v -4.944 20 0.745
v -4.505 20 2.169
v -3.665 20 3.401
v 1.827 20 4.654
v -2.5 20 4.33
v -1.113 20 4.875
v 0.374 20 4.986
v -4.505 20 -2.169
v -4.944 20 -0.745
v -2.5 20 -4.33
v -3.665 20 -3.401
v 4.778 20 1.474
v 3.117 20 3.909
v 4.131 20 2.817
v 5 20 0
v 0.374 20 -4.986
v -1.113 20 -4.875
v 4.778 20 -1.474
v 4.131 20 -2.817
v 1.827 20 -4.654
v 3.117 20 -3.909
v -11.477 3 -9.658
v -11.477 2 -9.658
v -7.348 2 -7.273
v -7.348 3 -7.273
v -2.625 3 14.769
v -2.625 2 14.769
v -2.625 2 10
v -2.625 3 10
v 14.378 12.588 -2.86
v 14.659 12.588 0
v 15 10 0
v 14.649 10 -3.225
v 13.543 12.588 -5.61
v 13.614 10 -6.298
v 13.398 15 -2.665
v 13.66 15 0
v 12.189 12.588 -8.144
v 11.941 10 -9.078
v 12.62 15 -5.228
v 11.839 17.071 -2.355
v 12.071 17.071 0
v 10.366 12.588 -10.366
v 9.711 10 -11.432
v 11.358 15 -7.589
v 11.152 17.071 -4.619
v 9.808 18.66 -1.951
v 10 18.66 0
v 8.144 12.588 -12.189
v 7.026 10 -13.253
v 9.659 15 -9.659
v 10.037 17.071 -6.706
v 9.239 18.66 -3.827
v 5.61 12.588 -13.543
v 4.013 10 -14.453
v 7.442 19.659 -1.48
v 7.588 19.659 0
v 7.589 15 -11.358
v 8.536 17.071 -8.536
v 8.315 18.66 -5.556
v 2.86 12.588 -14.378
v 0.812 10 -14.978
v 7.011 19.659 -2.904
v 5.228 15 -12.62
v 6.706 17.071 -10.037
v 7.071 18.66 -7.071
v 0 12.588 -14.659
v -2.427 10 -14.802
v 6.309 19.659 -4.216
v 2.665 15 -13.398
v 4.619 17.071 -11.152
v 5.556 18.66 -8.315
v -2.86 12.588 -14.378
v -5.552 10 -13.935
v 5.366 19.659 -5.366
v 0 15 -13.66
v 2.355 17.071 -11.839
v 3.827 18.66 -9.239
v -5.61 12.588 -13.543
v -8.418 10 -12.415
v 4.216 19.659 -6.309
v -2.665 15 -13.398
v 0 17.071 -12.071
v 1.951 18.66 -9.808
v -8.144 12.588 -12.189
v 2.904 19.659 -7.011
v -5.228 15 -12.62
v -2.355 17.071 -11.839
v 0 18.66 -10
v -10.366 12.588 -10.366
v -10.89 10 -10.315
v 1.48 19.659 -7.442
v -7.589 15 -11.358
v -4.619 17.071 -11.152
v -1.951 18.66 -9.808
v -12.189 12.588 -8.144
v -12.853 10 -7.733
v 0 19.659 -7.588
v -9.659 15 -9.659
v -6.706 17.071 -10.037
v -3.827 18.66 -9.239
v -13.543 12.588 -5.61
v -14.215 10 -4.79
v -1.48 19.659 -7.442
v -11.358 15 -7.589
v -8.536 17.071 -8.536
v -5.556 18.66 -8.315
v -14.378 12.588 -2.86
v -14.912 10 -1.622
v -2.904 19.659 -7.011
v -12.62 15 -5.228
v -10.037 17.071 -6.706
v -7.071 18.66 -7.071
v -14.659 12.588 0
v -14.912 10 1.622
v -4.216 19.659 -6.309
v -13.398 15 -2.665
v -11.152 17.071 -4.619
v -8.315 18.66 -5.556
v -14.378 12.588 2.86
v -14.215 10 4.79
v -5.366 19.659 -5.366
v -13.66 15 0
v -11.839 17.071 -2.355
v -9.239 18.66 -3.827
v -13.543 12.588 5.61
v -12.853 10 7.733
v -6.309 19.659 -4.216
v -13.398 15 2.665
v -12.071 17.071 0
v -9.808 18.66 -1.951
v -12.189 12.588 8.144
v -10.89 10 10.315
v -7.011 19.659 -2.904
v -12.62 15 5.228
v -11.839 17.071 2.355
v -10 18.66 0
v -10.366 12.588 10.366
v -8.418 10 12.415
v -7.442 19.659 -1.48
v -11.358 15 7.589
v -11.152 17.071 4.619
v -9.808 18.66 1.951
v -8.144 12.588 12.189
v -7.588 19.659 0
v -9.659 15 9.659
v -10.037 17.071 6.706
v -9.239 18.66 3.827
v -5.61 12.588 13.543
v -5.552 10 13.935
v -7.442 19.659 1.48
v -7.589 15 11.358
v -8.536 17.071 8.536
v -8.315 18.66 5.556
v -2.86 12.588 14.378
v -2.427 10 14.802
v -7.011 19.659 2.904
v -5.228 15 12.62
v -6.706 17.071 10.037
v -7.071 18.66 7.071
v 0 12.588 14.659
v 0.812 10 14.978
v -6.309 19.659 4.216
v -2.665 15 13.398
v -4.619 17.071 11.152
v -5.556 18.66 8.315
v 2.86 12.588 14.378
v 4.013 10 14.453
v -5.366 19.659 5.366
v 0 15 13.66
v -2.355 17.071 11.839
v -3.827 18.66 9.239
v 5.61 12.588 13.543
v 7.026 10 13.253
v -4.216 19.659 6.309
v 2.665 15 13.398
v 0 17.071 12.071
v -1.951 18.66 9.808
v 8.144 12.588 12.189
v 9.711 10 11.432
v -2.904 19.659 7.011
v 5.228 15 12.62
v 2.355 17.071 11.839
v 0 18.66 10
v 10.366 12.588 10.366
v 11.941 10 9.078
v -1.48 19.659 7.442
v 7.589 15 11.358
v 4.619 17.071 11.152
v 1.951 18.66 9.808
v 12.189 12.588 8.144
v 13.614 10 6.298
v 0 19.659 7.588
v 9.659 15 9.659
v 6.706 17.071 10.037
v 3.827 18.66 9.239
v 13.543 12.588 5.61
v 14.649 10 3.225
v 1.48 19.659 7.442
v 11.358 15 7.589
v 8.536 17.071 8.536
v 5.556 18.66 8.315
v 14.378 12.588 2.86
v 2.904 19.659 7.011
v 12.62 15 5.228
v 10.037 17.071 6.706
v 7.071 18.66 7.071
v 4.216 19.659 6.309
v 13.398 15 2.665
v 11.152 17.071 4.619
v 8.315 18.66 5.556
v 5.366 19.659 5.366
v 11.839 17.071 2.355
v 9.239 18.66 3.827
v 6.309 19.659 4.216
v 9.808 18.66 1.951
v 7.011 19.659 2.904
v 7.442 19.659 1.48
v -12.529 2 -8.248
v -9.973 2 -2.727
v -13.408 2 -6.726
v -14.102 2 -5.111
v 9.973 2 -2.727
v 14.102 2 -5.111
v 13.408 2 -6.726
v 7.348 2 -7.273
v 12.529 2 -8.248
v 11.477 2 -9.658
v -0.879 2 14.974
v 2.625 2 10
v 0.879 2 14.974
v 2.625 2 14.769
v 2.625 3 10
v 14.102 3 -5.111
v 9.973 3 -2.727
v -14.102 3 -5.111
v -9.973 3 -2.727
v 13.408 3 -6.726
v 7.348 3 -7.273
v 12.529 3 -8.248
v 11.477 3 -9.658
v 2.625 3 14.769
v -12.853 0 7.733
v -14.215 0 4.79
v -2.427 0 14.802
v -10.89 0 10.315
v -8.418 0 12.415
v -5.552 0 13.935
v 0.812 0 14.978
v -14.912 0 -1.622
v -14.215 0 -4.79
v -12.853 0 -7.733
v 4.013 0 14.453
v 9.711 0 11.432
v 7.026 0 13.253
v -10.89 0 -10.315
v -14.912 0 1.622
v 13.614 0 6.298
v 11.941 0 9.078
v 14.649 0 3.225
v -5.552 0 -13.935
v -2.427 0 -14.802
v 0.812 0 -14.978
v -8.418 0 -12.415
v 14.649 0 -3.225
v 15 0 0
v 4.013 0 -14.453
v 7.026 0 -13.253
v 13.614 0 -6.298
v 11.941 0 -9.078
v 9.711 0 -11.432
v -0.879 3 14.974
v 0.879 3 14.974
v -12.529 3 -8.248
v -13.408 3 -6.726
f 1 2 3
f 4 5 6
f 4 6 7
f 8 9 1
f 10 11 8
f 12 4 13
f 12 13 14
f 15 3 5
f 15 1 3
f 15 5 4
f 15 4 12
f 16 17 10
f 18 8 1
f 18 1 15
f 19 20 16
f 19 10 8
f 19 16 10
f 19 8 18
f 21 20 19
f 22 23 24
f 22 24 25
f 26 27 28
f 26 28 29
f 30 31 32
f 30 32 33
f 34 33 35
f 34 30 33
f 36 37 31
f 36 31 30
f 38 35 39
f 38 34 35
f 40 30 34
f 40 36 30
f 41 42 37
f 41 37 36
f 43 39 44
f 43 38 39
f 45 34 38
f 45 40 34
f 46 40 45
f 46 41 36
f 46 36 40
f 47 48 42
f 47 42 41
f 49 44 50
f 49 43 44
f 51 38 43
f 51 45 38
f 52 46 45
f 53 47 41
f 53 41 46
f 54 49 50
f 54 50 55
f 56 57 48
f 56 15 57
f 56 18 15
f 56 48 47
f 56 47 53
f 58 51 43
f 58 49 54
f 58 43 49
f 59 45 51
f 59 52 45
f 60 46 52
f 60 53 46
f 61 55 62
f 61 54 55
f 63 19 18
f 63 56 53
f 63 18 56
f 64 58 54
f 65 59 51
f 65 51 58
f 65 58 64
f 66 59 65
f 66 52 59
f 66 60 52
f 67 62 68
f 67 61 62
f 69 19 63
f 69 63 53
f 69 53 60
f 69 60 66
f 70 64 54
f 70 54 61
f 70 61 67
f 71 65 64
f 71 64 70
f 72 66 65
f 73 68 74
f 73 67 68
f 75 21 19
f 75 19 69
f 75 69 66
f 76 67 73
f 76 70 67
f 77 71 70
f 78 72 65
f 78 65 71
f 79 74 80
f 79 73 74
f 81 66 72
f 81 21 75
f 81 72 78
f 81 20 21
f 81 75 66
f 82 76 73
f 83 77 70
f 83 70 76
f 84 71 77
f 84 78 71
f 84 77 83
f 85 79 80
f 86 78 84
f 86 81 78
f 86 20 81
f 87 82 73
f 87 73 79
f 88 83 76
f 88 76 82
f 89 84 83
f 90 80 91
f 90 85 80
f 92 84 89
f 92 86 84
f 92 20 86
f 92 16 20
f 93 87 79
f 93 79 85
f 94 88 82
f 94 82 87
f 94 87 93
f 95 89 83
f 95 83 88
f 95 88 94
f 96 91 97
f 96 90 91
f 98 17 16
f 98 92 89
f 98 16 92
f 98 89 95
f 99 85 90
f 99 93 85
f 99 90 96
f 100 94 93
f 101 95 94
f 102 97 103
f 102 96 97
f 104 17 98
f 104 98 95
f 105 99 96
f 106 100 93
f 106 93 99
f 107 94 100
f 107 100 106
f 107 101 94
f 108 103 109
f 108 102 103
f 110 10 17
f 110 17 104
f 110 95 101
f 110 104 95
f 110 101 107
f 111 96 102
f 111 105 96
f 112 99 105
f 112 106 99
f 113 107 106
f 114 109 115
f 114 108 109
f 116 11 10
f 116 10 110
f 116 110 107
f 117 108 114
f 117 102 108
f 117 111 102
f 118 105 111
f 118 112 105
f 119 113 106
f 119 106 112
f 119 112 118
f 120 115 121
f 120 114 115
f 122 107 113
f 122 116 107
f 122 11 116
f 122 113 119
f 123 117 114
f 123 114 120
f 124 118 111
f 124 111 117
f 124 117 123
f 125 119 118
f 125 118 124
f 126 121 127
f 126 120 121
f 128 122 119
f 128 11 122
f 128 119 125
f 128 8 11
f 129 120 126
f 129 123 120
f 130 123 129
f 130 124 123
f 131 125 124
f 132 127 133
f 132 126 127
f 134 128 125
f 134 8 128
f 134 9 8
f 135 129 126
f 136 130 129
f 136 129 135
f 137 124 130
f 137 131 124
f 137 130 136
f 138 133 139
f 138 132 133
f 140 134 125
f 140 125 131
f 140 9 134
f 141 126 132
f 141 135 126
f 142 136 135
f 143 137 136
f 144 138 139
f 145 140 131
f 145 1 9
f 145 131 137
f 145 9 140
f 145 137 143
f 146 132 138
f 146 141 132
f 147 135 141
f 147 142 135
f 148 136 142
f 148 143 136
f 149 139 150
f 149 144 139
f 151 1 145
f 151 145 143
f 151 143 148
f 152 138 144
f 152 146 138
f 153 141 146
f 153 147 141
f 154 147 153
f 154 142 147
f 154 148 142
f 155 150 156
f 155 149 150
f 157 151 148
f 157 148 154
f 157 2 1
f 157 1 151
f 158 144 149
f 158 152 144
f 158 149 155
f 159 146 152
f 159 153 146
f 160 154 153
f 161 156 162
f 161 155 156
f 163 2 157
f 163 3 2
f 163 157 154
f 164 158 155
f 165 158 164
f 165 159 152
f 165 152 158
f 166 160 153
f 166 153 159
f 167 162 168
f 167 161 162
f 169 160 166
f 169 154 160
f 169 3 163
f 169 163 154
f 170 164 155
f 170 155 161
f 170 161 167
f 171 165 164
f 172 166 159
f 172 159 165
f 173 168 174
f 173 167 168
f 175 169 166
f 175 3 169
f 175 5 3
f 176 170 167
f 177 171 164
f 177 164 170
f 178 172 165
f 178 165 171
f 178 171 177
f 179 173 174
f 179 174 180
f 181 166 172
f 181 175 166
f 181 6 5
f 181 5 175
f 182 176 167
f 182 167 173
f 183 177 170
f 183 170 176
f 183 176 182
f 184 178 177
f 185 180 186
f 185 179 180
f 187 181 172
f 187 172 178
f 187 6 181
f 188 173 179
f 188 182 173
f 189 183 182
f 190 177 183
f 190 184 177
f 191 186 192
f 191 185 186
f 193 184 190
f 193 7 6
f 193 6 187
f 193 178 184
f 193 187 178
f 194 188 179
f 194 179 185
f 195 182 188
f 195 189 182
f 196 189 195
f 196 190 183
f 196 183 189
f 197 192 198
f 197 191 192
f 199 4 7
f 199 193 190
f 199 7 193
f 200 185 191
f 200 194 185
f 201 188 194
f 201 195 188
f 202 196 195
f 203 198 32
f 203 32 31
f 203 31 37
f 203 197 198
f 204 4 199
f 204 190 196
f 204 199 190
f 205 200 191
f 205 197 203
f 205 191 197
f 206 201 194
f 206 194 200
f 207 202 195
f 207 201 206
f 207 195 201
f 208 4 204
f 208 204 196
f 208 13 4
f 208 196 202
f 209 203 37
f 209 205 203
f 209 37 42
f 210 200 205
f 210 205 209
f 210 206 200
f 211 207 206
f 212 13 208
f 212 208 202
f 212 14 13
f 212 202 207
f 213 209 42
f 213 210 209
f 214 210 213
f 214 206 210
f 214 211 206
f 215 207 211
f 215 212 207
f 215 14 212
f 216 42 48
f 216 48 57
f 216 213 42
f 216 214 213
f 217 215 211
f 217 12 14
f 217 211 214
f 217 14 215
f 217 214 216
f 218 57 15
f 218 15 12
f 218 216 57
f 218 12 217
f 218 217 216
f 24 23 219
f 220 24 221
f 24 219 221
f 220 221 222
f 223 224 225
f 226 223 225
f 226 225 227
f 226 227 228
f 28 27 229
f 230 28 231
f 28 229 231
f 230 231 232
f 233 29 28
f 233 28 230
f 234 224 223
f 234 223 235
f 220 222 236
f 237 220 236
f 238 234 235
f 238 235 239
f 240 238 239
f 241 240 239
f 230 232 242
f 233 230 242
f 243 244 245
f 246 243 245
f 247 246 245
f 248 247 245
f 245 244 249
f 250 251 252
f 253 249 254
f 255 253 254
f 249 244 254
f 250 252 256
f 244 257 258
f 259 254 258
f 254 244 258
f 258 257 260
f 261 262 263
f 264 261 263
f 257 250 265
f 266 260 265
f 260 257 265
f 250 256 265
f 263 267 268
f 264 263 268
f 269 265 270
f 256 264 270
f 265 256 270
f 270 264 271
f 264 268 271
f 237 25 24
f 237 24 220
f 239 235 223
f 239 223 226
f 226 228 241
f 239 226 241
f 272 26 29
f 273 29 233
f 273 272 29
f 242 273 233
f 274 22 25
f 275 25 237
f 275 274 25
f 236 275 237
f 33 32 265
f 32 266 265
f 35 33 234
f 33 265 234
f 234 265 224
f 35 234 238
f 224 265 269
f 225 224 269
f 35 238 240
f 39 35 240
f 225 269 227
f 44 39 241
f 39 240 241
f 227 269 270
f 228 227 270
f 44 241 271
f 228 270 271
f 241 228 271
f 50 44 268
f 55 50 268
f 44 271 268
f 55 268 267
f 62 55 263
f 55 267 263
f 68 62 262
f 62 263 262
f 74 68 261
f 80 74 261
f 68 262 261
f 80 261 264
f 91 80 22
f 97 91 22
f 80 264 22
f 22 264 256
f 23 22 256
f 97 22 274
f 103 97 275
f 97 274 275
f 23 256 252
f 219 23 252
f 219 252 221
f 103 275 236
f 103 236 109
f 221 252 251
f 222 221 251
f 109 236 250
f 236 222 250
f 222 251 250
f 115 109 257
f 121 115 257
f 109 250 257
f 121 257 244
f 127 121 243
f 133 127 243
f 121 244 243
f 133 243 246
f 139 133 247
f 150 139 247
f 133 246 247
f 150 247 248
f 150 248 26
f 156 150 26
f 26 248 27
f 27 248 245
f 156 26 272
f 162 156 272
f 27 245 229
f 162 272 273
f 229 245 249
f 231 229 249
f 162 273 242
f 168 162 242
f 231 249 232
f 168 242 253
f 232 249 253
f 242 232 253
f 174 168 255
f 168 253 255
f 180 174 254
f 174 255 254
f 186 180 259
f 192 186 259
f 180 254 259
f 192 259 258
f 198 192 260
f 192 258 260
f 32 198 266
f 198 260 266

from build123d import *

# Parameters (mm, degrees)
SKETCH1_R           = 15
BOSS_EXTRUDE1_DEPTH = 20
FILLET1_R           = 10
CUT_EXTRUDE1_START  = 40
SKETCH2_W           = 5.25
SKETCH2_H           = 1
CUT_EXTRUDE1_DEPTH  = 30
CIRPATTERN1_COUNT   = 3


with BuildPart() as part:
    # Sketch1 → Boss-Extrude1 (new body)
    with BuildSketch(Plane(origin=(0, 0, 0), x_dir=(1, 0, 0), z_dir=(0, 1, 0))):
        Circle(SKETCH1_R)
    extrude(amount=BOSS_EXTRUDE1_DEPTH)

    # Fillet1
    fillet1_edges = [part.edges().sort_by_distance(p)[0] for p in [
        (-15, 20, 0),
    ]]
    fillet(fillet1_edges, radius=FILLET1_R)

    # Sketch2 → Cut-Extrude1 (cut)
    with BuildSketch(Plane.XY.offset(CUT_EXTRUDE1_START)):
        with Locations((0, 2.5)):
            Rectangle(SKETCH2_W, SKETCH2_H)
    cut_extrude1 = extrude(amount=-CUT_EXTRUDE1_DEPTH, mode=Mode.SUBTRACT)

    # CirPattern1: Cut-Extrude1 ×3 about axis
    cirpattern1_axis = Axis((0, 0, 0), (0, 1, 0))
    for i in range(1, CIRPATTERN1_COUNT):
        add(cut_extrude1.rotate(cirpattern1_axis, i * 360 / CIRPATTERN1_COUNT), mode=Mode.SUBTRACT)


solid = part.part
